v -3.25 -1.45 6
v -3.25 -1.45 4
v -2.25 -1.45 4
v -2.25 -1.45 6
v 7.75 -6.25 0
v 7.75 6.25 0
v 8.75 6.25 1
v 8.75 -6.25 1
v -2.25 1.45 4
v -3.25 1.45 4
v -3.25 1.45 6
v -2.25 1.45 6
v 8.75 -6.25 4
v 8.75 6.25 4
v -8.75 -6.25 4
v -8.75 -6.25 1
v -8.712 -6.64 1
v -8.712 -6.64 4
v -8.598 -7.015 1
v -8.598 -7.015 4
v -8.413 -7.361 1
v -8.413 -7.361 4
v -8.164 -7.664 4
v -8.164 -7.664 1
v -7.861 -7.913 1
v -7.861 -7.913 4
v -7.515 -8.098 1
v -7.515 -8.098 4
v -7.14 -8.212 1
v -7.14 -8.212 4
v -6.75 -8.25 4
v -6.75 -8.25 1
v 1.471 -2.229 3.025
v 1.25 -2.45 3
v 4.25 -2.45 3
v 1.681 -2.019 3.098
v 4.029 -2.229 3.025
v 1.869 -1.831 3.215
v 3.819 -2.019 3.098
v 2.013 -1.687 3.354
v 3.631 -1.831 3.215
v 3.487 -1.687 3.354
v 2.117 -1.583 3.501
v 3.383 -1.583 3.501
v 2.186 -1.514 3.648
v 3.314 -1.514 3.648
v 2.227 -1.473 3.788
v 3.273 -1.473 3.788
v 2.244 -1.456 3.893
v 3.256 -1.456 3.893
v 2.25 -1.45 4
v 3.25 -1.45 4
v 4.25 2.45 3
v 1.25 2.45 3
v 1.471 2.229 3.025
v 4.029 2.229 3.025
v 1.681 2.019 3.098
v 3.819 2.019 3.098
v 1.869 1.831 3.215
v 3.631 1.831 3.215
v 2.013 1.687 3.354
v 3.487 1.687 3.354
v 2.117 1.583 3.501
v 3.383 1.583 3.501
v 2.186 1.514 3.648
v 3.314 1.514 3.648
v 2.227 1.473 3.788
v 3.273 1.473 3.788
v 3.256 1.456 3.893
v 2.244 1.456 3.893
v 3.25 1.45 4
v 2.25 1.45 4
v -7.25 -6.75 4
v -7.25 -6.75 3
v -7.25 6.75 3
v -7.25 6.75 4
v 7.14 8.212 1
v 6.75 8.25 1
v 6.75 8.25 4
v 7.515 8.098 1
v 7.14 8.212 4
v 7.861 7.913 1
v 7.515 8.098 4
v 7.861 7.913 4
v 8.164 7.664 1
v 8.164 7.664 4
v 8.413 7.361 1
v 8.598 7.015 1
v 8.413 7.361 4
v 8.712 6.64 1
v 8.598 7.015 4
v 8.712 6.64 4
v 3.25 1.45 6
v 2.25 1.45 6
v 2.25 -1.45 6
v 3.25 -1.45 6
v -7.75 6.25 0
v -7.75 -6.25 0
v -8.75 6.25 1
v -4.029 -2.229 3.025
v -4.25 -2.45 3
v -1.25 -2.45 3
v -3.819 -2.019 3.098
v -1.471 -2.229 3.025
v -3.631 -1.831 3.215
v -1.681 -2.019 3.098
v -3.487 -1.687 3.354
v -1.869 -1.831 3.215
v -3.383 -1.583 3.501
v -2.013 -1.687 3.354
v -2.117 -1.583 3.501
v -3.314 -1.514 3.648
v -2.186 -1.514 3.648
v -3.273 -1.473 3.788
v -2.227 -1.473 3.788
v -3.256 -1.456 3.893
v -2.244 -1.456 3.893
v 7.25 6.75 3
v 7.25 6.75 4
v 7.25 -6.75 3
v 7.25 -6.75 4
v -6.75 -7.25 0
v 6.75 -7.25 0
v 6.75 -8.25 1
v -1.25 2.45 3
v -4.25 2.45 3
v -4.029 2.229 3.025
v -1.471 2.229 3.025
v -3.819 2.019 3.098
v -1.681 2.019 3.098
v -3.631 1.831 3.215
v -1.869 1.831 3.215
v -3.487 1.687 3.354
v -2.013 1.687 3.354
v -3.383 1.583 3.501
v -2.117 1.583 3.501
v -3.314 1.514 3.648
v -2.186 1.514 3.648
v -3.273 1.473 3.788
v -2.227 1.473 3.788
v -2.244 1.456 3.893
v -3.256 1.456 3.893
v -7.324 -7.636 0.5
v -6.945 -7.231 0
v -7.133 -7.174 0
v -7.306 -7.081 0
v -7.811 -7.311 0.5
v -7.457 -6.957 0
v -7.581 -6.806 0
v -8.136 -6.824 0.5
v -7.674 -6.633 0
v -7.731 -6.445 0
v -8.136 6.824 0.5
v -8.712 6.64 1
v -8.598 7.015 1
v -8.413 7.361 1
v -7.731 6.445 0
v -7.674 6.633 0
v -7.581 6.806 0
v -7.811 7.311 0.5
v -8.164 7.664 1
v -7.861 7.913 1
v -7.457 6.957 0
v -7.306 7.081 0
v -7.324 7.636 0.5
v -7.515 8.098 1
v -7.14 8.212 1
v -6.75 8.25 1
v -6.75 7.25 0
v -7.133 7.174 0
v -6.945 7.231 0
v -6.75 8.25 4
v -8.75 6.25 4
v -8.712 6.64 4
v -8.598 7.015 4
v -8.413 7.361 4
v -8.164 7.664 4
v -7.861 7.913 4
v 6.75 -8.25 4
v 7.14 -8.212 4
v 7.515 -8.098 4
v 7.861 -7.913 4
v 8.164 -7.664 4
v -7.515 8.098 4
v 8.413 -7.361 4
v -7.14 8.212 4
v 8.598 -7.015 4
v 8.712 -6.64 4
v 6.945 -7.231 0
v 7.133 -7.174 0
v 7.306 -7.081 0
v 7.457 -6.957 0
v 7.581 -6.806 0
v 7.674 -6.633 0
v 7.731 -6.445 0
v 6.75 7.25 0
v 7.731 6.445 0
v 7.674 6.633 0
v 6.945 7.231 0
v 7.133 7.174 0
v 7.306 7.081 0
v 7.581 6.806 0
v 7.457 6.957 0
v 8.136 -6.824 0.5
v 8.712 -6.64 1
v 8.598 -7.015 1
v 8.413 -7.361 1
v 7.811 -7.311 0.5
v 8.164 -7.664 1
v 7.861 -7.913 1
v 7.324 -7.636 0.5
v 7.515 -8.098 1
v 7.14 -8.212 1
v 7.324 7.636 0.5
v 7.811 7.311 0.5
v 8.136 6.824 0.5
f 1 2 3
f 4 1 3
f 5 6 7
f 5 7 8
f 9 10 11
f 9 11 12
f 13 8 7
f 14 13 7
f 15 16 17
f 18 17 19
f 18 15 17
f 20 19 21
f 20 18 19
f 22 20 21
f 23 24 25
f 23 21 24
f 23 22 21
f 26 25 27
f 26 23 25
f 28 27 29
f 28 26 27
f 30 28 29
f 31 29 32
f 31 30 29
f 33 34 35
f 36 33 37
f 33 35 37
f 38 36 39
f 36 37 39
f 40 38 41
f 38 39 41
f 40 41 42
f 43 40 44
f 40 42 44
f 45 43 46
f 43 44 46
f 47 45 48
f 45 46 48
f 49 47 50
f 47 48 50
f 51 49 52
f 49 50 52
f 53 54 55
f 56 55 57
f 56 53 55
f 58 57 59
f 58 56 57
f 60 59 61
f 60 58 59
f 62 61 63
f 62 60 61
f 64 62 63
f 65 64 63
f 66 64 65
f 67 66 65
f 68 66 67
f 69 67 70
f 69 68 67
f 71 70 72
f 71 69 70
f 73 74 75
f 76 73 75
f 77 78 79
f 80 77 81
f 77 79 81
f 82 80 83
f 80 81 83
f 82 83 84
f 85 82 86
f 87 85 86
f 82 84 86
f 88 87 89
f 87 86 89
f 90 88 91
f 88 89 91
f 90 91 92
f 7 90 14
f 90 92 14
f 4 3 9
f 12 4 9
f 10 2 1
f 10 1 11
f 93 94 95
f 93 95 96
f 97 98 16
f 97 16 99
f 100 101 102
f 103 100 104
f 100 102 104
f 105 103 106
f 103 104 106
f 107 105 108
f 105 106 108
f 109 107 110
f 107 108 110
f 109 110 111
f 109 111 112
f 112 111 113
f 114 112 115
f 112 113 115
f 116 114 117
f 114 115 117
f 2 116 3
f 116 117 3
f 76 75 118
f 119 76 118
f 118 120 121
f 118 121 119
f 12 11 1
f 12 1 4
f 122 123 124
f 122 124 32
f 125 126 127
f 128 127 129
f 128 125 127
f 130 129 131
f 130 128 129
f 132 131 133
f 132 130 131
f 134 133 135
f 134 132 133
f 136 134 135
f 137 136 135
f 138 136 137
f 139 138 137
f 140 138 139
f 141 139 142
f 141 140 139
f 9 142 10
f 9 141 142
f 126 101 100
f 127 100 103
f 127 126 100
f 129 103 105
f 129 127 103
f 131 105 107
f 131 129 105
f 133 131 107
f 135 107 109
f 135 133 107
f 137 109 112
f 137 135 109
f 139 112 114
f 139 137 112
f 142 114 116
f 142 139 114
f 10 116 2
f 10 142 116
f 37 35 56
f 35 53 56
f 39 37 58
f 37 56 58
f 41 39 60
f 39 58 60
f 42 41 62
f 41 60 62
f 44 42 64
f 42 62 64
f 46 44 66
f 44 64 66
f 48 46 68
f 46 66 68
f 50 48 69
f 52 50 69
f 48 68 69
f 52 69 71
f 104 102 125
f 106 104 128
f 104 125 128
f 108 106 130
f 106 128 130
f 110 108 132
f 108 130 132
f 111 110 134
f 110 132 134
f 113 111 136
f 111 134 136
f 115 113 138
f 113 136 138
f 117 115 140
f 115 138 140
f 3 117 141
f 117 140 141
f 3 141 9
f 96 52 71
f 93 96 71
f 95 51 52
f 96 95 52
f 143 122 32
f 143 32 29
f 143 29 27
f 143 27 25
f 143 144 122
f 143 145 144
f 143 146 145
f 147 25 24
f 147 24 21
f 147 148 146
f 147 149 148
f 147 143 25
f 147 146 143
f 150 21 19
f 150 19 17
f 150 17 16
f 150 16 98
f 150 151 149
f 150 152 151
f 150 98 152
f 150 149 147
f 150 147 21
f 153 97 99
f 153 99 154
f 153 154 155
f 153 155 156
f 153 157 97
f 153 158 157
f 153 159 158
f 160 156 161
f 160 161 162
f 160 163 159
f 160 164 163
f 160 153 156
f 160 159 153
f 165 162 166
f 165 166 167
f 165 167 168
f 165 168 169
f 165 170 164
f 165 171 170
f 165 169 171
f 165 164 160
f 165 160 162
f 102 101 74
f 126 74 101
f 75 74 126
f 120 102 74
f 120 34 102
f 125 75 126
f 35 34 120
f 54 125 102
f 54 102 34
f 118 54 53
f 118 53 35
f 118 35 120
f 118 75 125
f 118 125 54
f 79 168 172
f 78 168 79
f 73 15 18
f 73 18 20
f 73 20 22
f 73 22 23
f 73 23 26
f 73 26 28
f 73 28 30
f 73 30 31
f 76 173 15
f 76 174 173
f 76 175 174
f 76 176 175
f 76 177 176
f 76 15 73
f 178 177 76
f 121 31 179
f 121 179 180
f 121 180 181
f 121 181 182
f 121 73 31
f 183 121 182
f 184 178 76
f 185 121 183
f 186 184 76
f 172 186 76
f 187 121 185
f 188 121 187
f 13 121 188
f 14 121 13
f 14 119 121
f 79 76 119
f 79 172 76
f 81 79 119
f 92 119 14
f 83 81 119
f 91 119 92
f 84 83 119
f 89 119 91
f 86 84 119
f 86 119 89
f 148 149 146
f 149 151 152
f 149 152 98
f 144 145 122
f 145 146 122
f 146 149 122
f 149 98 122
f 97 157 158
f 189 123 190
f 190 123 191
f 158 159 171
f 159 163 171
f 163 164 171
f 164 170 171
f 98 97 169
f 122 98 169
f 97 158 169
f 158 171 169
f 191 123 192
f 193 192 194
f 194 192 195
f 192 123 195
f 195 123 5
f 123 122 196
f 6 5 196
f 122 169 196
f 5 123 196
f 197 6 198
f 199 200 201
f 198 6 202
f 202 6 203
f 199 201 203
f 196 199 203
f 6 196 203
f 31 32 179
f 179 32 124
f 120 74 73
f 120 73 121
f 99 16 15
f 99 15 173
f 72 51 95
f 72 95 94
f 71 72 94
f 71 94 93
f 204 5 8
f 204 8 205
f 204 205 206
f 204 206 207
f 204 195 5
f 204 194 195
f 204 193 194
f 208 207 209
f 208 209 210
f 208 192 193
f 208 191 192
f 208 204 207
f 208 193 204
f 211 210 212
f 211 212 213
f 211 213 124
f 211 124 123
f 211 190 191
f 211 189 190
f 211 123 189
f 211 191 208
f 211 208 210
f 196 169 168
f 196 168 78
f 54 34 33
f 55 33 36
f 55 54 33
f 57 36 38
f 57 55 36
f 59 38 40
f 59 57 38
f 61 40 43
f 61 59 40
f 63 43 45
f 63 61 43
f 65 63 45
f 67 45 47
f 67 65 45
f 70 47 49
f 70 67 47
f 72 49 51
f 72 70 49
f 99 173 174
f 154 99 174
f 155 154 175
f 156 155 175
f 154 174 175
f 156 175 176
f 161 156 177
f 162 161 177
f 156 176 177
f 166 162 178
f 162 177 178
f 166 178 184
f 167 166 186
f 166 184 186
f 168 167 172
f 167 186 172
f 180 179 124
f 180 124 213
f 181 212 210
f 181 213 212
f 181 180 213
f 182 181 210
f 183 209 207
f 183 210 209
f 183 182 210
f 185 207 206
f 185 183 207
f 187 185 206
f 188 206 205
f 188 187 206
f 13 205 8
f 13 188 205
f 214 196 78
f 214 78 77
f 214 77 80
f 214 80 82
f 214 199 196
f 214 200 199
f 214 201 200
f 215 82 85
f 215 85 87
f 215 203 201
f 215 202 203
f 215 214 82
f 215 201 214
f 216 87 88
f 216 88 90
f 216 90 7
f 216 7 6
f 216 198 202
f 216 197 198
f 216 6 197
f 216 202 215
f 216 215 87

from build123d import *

# Parameters (mm, degrees)
SKETCH_W     = 17.5
SKETCH_H     = 16.5
PAD_DEPTH    = 4
SKETCH002_W  = 14.5
SKETCH002_H  = 13.5
POCKET_DEPTH = 5
SKETCH003_W  = 1
SKETCH003_H  = 2.9
PAD001_DEPTH = 3
FILLET_R     = 1
FILLET001_R  = 2
CHAMFER_SIZE = 1


with BuildPart() as part:
    # Sketch → Pad (new body)
    with BuildSketch(Plane.XY):
        Rectangle(SKETCH_W, SKETCH_H)
    extrude(amount=PAD_DEPTH)

    # Sketch002 → Pocket (cut)
    with BuildSketch(Plane.XY.offset(3)):
        Rectangle(SKETCH002_W, SKETCH002_H)
    extrude(amount=POCKET_DEPTH, mode=Mode.SUBTRACT)

    # Sketch003 (on Face11 of Pocket) → Pad001 (join)
    with BuildSketch(Plane.XY.offset(3)):
        with Locations((-2.75, 0)):
            Rectangle(SKETCH003_W, SKETCH003_H)
        with Locations((2.75, 0)):
            Rectangle(SKETCH003_W, SKETCH003_H)
    extrude(amount=PAD001_DEPTH)

    # Fillet
    fillet_edges = [part.edges().sort_by_distance(p)[0] for p in [
        (2.75, 1.45, 3),
        (3.25, 0, 3),
        (2.75, -1.45, 3),
        (2.25, 0, 3),
        (-2.75, 1.45, 3),
        (-3.25, 0, 3),
        (-2.75, -1.45, 3),
        (-2.25, 0, 3),
    ]]
    fillet(fillet_edges, radius=FILLET_R)

    # Fillet001
    fillet001_edges = [part.edges().sort_by_distance(p)[0] for p in [
        (-8.75, 8.25, 2),
        (8.75, 8.25, 2),
        (8.75, -8.25, 2),
        (-8.75, -8.25, 2),
    ]]
    fillet(fillet001_edges, radius=FILLET001_R)

    # Chamfer
    chamfer_edges = [part.edges().sort_by_distance(p)[0] for p in [
        (-8.75, 0, 0),
        (-8.164214, 7.664214, 0),
        (-8.164214, -7.664214, 0),
        (0, 8.25, 0),
        (0, -8.25, 0),
        (8.164214, 7.664214, 0),
        (8.164214, -7.664214, 0),
        (8.75, 0, 0),
    ]]
    chamfer(chamfer_edges, length=CHAMFER_SIZE)


solid = part.part
